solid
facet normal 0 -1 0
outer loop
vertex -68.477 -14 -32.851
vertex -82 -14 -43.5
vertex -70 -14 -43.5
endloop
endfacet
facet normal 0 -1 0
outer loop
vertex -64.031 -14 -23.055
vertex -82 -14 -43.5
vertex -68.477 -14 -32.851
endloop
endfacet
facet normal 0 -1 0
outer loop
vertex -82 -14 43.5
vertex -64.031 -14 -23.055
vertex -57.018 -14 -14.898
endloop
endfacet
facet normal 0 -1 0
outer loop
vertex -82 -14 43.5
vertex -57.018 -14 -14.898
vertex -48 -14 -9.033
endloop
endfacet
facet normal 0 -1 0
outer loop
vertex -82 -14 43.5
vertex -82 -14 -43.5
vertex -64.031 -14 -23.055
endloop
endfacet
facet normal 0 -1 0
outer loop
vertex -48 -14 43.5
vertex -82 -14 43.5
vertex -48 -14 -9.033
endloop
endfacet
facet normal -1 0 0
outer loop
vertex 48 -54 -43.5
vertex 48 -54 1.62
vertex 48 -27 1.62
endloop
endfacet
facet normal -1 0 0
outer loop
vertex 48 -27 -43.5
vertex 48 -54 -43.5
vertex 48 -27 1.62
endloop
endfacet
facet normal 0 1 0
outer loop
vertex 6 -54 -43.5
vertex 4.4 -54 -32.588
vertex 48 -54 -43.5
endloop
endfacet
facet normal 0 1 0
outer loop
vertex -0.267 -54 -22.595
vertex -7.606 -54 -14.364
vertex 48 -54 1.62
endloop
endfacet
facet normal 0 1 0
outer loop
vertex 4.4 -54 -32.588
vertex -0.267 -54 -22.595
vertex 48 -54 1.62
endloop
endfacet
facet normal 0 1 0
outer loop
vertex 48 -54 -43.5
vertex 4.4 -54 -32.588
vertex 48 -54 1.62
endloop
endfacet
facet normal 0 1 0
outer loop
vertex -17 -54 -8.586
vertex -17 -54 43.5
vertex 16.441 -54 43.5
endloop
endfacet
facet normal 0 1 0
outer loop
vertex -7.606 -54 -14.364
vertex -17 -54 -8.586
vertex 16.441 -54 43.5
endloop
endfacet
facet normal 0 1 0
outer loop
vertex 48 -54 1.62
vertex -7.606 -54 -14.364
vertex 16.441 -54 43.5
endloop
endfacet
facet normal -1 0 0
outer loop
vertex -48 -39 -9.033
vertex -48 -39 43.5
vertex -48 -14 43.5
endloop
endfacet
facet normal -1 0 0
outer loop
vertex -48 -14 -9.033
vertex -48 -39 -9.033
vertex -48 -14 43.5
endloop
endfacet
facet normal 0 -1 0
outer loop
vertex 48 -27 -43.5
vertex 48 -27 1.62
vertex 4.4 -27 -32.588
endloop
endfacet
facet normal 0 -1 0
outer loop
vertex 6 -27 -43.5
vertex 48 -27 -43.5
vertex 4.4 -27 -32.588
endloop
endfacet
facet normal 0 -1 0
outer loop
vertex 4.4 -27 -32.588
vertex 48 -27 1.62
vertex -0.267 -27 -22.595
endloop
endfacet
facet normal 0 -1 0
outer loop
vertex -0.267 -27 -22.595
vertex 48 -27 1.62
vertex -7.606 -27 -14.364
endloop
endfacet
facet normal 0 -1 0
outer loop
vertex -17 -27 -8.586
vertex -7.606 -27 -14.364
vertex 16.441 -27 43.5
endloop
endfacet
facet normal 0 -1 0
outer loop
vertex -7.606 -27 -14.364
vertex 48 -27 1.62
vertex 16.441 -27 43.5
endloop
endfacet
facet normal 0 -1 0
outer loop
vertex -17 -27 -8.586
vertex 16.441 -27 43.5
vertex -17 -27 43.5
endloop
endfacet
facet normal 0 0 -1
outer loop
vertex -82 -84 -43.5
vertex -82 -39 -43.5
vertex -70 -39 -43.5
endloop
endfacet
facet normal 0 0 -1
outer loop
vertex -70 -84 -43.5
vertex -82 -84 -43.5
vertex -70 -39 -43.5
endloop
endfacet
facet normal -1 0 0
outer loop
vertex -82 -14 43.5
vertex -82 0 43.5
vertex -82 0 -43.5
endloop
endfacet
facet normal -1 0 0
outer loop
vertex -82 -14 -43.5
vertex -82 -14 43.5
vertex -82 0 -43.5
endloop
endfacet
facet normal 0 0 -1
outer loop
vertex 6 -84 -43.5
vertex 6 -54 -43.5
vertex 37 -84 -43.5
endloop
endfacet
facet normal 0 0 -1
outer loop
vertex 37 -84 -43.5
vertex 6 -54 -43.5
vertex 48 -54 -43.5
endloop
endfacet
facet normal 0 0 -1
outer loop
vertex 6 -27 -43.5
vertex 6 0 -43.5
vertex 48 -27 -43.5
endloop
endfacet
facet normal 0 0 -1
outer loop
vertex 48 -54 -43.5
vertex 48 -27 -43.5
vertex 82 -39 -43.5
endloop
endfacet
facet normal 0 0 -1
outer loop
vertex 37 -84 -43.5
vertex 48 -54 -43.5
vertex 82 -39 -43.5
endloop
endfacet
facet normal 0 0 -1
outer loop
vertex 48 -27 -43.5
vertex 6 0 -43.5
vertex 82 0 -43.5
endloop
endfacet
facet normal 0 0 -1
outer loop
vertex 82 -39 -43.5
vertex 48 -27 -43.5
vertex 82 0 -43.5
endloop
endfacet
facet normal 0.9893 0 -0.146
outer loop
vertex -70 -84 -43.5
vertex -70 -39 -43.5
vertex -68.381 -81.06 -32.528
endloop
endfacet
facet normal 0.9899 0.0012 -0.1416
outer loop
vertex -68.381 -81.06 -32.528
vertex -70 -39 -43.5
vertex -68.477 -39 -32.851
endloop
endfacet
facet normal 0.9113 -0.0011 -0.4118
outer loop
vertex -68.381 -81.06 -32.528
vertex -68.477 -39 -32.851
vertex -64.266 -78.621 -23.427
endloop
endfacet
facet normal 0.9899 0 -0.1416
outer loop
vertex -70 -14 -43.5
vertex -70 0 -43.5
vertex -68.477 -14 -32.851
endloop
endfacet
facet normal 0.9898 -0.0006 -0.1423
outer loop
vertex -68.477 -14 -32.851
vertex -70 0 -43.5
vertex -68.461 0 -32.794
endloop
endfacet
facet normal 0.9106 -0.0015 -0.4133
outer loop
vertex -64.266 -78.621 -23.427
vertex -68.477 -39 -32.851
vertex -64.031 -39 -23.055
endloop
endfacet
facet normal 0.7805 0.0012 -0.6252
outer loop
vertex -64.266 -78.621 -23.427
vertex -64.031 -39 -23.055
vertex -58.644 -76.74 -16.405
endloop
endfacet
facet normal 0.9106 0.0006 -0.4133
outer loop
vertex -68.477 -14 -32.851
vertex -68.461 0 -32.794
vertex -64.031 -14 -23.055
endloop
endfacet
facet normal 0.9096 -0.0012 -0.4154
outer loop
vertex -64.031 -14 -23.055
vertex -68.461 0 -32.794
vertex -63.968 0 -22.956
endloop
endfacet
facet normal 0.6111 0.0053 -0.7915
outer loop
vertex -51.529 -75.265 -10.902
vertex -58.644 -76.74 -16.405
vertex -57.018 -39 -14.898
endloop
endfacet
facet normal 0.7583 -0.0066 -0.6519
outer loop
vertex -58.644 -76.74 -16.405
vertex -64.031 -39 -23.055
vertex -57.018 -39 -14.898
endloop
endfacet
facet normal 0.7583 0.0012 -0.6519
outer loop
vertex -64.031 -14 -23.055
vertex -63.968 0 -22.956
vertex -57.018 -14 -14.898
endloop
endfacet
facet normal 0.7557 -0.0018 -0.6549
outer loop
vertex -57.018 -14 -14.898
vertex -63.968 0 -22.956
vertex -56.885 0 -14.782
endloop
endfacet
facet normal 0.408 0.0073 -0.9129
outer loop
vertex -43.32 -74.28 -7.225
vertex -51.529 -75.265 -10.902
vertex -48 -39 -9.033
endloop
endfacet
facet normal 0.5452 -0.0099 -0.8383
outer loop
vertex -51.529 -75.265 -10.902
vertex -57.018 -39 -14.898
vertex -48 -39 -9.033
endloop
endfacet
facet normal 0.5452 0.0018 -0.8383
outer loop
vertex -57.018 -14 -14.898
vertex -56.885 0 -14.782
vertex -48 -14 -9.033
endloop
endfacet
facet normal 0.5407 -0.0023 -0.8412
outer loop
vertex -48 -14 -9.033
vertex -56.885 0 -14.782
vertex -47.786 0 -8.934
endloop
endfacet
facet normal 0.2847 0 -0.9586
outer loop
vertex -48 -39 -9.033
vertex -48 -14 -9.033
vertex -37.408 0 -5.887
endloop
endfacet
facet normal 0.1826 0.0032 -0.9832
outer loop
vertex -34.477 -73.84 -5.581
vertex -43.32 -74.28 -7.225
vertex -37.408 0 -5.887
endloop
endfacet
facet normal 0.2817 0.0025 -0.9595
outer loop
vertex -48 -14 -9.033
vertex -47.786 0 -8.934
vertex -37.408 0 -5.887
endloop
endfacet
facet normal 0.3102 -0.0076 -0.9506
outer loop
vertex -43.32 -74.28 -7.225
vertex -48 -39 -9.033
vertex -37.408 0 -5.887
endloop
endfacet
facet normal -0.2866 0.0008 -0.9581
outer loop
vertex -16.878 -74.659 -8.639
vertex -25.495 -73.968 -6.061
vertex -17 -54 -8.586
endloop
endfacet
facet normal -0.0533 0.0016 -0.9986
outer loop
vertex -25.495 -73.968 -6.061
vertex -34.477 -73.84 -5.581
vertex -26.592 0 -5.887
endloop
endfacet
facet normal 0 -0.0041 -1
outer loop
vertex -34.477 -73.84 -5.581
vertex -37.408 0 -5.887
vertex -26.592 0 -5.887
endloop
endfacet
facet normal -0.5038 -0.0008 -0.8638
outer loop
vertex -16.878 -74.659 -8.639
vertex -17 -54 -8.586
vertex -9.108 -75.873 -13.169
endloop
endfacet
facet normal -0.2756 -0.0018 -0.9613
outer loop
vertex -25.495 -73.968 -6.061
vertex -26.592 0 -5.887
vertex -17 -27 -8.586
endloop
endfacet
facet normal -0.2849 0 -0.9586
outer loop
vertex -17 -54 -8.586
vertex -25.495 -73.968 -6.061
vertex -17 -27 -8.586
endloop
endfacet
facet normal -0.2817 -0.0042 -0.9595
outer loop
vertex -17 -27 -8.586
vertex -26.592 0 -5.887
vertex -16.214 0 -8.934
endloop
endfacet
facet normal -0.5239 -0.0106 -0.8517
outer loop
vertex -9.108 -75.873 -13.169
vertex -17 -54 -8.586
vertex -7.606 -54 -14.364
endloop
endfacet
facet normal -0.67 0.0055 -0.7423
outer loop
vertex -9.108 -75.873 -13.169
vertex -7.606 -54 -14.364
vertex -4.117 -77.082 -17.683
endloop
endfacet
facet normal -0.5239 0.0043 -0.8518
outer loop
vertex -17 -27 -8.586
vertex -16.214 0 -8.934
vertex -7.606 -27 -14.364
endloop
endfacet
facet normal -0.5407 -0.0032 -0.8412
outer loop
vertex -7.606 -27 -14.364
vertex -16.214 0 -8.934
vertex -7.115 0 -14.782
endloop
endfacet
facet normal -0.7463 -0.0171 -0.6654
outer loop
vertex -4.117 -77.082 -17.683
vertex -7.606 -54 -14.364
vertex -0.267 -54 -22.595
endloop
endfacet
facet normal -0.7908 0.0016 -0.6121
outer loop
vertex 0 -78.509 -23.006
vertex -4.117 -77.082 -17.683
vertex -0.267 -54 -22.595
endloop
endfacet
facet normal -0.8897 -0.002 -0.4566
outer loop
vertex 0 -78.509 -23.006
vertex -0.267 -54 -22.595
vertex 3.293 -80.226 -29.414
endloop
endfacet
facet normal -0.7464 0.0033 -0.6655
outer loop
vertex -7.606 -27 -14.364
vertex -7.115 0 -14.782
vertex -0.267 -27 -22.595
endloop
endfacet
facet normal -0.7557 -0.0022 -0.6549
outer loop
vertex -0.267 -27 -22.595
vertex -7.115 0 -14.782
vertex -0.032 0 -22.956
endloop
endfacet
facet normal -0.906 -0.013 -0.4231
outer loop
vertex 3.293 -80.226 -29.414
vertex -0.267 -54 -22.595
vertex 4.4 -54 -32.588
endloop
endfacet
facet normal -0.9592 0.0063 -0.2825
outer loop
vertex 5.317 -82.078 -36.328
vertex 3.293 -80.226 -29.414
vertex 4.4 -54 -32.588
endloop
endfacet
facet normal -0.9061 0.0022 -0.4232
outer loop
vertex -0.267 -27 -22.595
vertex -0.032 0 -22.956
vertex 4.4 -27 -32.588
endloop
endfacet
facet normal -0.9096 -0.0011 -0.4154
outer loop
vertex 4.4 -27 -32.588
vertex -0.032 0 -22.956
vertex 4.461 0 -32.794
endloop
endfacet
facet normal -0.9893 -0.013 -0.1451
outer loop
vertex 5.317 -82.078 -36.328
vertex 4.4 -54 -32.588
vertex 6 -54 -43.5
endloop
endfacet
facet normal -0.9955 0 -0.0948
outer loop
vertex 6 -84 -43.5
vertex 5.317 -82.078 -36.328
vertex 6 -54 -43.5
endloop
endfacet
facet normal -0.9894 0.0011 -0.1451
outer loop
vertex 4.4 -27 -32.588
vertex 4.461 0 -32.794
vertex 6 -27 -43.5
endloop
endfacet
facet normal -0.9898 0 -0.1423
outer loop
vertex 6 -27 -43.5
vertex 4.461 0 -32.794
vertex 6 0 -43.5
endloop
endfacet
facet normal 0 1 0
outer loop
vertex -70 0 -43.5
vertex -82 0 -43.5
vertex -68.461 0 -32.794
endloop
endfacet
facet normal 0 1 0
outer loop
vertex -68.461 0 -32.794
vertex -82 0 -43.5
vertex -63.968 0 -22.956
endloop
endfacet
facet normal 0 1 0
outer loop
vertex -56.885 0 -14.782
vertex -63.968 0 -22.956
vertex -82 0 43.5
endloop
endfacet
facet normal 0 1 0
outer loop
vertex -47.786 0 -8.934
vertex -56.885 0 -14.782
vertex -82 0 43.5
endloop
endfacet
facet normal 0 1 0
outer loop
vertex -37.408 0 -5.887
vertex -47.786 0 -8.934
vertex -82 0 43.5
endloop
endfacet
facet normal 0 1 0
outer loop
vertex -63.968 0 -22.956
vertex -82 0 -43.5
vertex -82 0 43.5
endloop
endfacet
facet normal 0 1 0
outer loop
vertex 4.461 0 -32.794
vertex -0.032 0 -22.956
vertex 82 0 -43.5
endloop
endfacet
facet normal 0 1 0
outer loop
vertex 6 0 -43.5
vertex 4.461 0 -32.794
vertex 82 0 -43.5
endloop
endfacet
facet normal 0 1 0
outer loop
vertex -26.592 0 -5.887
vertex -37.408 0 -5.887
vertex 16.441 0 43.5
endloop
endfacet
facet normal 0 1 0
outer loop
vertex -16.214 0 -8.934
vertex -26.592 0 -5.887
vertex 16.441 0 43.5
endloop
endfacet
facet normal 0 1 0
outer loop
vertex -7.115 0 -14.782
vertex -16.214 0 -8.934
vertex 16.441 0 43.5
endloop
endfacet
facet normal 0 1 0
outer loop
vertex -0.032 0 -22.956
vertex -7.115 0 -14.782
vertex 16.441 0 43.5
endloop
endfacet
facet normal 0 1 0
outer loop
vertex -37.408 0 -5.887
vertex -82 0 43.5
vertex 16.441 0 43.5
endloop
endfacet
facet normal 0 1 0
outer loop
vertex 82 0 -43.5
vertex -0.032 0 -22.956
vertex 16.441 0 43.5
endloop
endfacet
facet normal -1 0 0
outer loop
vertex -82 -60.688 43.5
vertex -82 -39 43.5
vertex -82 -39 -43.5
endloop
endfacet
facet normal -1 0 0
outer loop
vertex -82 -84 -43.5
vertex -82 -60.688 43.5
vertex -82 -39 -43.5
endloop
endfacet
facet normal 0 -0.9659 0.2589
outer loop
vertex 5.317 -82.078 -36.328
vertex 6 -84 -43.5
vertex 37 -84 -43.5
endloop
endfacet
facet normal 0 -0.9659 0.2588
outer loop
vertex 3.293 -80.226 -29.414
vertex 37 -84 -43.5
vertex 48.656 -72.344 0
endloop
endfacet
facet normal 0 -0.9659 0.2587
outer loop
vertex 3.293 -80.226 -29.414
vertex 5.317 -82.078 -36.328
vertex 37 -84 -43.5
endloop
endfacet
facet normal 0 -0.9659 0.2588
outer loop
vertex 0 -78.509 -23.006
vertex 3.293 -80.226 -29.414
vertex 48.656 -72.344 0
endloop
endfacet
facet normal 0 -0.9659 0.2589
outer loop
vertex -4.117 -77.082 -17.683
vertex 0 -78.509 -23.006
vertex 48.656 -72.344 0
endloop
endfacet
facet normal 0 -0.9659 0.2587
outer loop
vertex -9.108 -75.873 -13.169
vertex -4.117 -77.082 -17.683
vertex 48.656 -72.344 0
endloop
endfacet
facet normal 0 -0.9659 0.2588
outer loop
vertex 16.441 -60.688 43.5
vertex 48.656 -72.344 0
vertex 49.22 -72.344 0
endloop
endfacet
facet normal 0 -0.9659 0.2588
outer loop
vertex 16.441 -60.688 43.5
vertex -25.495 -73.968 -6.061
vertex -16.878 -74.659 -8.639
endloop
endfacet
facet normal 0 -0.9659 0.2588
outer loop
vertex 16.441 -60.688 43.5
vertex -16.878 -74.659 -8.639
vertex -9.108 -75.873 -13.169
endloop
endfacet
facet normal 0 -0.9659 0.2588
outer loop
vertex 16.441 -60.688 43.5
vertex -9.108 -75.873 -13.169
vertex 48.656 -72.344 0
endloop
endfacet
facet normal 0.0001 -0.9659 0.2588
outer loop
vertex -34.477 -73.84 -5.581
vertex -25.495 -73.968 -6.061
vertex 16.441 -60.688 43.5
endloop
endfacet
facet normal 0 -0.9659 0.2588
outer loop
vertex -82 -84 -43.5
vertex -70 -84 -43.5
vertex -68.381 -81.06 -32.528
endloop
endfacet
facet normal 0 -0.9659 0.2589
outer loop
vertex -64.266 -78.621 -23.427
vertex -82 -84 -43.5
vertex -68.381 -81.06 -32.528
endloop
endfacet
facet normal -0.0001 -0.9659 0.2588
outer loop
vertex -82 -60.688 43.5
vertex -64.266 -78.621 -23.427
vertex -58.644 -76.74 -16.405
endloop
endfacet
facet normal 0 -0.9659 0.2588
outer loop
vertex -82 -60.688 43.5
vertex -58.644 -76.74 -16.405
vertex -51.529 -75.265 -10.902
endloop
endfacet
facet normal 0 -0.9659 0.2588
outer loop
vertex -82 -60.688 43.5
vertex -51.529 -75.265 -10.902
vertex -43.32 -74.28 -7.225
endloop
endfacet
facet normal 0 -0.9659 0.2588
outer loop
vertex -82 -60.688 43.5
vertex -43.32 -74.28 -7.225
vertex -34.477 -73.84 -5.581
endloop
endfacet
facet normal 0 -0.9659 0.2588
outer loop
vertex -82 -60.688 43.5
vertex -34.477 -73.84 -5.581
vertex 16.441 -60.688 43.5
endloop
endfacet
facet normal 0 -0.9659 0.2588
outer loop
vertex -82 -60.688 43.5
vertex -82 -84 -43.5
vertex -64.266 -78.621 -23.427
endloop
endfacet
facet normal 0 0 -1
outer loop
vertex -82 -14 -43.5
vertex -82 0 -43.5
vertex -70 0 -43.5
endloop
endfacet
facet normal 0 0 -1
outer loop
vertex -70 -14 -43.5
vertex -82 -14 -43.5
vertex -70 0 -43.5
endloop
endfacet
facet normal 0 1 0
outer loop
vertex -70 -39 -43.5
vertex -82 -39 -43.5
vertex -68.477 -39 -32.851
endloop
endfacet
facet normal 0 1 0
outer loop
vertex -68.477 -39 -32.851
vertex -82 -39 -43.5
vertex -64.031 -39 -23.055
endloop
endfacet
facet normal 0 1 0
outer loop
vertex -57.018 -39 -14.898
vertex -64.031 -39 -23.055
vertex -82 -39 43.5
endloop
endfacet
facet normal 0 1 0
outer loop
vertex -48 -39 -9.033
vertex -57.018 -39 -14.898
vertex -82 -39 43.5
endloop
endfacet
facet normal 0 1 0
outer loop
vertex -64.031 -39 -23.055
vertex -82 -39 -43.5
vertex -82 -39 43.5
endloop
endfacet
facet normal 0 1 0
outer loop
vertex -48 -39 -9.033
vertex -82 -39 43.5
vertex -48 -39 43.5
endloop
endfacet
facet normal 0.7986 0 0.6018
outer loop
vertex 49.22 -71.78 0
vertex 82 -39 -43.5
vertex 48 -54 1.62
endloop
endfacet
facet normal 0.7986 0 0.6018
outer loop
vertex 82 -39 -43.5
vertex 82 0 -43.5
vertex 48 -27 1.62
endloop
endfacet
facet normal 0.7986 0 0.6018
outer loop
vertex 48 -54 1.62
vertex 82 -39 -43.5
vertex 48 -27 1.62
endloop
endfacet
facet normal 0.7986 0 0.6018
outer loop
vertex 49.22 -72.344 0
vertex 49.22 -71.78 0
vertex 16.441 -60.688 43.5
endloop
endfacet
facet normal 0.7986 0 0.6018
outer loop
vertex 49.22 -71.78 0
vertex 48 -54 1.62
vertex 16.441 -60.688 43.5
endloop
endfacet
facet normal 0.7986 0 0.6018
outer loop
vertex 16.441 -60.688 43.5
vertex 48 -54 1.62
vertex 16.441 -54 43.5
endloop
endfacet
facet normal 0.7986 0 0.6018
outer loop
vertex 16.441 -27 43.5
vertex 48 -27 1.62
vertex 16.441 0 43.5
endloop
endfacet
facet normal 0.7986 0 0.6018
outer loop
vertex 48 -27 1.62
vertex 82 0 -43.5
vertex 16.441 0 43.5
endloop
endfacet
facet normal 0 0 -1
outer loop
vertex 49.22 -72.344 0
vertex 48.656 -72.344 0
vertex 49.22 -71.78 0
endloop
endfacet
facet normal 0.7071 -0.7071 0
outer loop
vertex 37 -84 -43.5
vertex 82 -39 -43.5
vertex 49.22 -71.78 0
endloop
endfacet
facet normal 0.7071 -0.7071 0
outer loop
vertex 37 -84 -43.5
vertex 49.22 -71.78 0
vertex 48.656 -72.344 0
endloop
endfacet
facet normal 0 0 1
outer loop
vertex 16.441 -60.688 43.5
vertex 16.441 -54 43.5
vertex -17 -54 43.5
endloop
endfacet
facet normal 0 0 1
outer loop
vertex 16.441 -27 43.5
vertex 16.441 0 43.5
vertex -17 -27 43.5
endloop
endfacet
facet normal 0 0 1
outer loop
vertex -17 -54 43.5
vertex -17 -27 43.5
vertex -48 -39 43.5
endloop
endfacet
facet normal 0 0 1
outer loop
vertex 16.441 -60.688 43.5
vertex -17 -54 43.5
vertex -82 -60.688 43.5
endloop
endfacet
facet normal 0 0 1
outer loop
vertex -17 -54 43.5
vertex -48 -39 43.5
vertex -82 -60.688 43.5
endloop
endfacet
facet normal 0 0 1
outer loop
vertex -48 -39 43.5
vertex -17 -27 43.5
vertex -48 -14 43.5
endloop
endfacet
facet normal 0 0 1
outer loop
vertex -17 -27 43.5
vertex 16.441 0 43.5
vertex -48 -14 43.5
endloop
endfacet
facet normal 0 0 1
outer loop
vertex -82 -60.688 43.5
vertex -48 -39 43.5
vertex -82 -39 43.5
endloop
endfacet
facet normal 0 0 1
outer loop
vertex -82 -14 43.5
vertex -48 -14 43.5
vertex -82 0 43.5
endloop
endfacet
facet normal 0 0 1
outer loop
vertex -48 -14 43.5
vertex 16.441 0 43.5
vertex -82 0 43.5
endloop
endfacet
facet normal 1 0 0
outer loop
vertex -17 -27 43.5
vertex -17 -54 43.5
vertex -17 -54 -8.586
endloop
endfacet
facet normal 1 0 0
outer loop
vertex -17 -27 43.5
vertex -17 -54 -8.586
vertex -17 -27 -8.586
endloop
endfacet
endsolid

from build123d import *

# Parameters (mm, degrees)
F1_DEPTH      = 84
F2_W          = 31.5592023589
F2_H          = 27
F2_W_2        = 33.4407976411
F2_W_3        = 34
F2_H_2        = 25
F3_DEPTH      = 187.4
F5_DEPTH      = 299
F5_DEPTH_BACK = 323
F7_DEPTH      = 75.8


with BuildPart() as f1:
    # F0 (on Front) → F1 (new body)
    with BuildSketch(Plane.XZ):
        with BuildLine():
            Line((82, -43.5), (16.4407976411, 43.5))
            Line((16.4407976411, 43.5), (0, 43.5))
            Line((0, 43.5), (-82, 43.5))
            Line((-82, 43.5), (-82, -43.5))
            Line((-82, -43.5), (-70, -43.5))
            ThreePointArc((-70, -43.5), (-32, -5.5), (6, -43.5))
            Line((6, -43.5), (82, -43.5))
        make_face()
    extrude(amount=F1_DEPTH)

    # F2 (on face) → F3 (cut)
    with BuildSketch(Plane.XY.offset(43.5)):
        with Locations((32.2203988205, -40.5)):
            Rectangle(F2_W, F2_H)
        with Locations((-0.2796011795, -40.5)):
            Rectangle(F2_W_2, F2_H)
        with Locations((-65, -26.5)):
            Rectangle(F2_W_3, F2_H_2)
    extrude(amount=-F3_DEPTH, mode=Mode.SUBTRACT)

    # F4 (on Right) → F5 (cut, two sides)
    with BuildSketch(Plane.YZ) as f5_sk:
        Polygon((-84, -43.5), (-60.6884202585, 43.5), (-84, 43.5), align=None)
    extrude(amount=F5_DEPTH, mode=Mode.SUBTRACT)
    extrude(f5_sk.sketch, amount=-F5_DEPTH_BACK, mode=Mode.SUBTRACT)

    # F6 (on Top) → F7 (cut)
    with BuildSketch(Plane.XY):
        Polygon((82, -84), (48.8038917131, -72.1961082869), (37, -84), align=None)
        Polygon((82, -39), (48.8038917131, -72.1961082869), (82, -84), align=None)
    extrude(amount=-F7_DEPTH, mode=Mode.SUBTRACT)


solid = f1.part
